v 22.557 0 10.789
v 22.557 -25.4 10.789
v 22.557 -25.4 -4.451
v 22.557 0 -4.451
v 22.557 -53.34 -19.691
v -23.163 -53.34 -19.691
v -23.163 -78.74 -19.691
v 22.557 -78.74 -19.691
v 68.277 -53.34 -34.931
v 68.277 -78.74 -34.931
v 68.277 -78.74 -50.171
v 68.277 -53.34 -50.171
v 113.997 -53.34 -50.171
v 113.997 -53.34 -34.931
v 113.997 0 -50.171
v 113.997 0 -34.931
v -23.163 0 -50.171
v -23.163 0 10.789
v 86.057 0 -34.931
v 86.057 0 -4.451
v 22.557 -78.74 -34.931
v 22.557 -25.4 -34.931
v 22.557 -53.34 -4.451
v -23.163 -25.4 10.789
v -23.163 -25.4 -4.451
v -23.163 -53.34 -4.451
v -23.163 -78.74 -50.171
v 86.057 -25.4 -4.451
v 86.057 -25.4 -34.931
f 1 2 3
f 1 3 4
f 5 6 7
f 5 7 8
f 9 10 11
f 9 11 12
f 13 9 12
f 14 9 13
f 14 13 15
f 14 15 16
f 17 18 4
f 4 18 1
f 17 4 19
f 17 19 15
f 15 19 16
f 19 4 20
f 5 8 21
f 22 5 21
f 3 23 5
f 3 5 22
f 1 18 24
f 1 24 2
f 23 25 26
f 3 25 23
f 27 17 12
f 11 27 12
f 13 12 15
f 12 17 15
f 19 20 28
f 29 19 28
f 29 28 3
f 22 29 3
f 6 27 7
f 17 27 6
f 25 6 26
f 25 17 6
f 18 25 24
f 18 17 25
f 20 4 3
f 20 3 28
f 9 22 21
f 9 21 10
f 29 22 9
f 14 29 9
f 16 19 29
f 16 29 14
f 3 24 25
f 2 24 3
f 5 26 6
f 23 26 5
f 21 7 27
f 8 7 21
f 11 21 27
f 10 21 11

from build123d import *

# Parameters (mm, degrees)
F0_W     = 137.16
F0_H     = 60.96
F1_DEPTH = 78.74
F2_W     = 45.72
F2_H     = 25.4
F3_DEPTH = 60.961
F4_DEPTH = 45.72
F2_W_2   = 63.5
F5_DEPTH = 15.24
F2_H_2   = 27.94
F6_DEPTH = 15.24
F7_DEPTH = 30.48


with BuildPart() as f1:
    # F0 (on Front) → F1 (new body)
    with BuildSketch(Plane.XZ):
        with Locations((45.417035, -19.691394)):
            Rectangle(F0_W, F0_H)
    extrude(amount=F1_DEPTH)

    # F2 (on face) → F3 (cut, through all)
    with BuildSketch(Plane.XY.offset(10.788606)):
        with Locations((91.137035, -66.04)):
            Rectangle(F2_W, F2_H)
    extrude(amount=-F3_DEPTH, mode=Mode.SUBTRACT)

    # F2 (on face) → F4 (cut)
    with BuildSketch(Plane.XY.offset(10.788606)):
        Polygon((86.057035, -25.4), (22.557035, -25.4), (22.557035, -53.34), (22.557035, -78.74), (68.277035, -78.74), (68.277035, -53.34), (113.997035, -53.34), (113.997035, 0), (86.057035, 0), align=None)
    extrude(amount=-F4_DEPTH, mode=Mode.SUBTRACT)

    # F2 (on face) → F5 (cut)
    with BuildSketch(Plane.XY.offset(10.788606)):
        with Locations((54.307035, -12.7)):
            Rectangle(F2_W_2, F2_H)
    extrude(amount=-F5_DEPTH, mode=Mode.SUBTRACT)

    # F2 (on face) → F6 (cut)
    with BuildSketch(Plane.XY.offset(10.788606)):
        with Locations((-0.302965, -39.37)):
            Rectangle(F2_W, F2_H_2)
    extrude(amount=-F6_DEPTH, mode=Mode.SUBTRACT)

    # F2 (on face) → F7 (cut)
    with BuildSketch(Plane.XY.offset(10.788606)):
        with Locations((-0.302965, -66.04)):
            Rectangle(F2_W, F2_H)
    extrude(amount=-F7_DEPTH, mode=Mode.SUBTRACT)


solid = f1.part
